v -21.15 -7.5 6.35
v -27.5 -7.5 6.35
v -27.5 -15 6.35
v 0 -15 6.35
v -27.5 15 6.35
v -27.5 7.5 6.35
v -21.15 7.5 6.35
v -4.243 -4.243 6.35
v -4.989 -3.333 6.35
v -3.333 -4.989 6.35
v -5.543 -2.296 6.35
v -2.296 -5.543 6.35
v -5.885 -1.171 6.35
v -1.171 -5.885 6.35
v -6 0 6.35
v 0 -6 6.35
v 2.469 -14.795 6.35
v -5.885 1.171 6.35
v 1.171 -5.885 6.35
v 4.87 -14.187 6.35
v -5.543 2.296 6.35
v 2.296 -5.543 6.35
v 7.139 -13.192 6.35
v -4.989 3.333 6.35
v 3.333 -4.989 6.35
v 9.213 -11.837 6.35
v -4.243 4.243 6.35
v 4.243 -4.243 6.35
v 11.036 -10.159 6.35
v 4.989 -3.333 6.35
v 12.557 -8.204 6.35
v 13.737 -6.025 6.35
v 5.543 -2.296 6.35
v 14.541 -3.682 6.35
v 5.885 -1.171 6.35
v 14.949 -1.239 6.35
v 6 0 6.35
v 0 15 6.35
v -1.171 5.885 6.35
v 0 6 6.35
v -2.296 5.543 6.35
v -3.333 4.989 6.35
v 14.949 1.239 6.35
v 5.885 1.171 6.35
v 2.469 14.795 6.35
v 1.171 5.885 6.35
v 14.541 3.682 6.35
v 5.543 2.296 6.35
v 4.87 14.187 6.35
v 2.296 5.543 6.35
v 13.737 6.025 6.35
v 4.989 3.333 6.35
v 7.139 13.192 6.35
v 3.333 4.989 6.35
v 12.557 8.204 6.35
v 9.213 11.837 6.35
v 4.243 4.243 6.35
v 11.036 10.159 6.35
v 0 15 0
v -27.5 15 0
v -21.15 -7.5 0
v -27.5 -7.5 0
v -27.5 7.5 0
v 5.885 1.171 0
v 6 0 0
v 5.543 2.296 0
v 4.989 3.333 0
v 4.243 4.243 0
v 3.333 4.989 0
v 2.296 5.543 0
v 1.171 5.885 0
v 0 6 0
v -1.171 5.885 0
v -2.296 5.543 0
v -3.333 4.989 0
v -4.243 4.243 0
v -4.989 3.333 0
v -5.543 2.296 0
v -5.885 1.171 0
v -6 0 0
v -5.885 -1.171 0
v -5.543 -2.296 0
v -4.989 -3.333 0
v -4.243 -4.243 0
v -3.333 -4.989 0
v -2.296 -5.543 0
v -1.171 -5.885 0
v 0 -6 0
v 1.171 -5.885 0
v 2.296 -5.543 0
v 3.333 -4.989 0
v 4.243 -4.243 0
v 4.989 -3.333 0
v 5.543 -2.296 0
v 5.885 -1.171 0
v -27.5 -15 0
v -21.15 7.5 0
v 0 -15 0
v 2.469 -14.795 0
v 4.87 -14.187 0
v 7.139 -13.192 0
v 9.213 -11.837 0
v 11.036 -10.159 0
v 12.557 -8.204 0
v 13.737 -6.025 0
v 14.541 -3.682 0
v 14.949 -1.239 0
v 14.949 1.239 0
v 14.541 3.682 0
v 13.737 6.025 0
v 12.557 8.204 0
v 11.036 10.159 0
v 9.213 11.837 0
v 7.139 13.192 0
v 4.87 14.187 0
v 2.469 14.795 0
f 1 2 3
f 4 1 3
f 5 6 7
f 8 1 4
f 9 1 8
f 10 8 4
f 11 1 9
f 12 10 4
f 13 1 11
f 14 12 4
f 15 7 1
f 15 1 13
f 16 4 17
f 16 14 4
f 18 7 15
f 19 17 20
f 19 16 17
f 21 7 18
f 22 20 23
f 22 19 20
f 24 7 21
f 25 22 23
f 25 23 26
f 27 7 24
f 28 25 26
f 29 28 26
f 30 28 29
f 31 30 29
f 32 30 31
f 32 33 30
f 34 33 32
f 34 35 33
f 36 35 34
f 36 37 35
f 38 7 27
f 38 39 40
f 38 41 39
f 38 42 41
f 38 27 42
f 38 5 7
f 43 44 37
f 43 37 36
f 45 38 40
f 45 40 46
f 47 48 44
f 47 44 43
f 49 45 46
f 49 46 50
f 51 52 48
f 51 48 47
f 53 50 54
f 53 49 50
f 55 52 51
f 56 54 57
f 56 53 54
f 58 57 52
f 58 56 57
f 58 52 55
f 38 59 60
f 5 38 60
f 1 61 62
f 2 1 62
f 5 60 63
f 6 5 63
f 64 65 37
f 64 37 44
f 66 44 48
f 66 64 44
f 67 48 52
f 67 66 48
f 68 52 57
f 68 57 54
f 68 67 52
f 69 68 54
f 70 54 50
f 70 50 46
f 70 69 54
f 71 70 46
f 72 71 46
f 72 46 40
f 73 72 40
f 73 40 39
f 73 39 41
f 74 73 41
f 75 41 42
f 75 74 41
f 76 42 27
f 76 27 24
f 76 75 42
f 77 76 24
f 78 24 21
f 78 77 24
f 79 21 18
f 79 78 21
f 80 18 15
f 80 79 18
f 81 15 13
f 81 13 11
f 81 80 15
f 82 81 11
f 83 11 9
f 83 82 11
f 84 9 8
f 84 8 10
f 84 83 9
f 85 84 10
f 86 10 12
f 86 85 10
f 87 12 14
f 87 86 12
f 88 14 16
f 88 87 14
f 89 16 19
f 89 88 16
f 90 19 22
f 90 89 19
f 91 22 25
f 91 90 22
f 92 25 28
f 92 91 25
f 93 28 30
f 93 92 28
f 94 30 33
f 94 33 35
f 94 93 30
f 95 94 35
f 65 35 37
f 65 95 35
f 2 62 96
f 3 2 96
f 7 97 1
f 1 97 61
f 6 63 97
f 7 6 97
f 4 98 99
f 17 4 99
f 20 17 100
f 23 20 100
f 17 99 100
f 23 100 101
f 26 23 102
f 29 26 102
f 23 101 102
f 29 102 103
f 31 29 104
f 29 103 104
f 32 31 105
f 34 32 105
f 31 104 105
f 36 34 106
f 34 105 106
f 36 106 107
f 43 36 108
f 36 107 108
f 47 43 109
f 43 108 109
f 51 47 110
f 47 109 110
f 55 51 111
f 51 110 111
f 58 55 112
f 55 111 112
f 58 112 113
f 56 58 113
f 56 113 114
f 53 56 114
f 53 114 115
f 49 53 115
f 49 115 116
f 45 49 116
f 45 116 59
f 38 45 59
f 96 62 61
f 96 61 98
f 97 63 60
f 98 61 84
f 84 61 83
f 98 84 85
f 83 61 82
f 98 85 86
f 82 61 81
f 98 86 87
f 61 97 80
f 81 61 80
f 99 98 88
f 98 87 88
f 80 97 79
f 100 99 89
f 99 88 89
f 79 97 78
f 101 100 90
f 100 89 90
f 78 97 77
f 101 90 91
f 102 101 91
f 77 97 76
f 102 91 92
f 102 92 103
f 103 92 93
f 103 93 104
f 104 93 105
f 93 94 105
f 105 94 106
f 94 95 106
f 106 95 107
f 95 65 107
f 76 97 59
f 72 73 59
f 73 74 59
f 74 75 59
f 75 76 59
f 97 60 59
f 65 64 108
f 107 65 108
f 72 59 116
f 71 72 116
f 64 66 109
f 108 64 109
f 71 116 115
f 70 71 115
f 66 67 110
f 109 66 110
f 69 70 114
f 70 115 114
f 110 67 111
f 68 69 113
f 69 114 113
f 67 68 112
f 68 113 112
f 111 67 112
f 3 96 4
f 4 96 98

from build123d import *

# Parameters (mm, degrees)
F0_R     = 6
F1_DEPTH = 6.35


# Not quite as in the source:
# - a feature names something its author has since deleted; it is built from what else it names


with BuildPart() as f1:
    # F0 (on Top) → F1 (new body)
    with BuildSketch(Plane.XY):
        with BuildLine():
            Line((-27.5, 15), (-27.5, 7.5))
            Line((-27.5, 7.5), (-21.15, 7.5))
            Line((-21.15, 7.5), (-21.15, -7.5))
            Line((-21.15, -7.5), (-27.5, -7.5))
            Line((-27.5, -7.5), (-27.5, -15))
            Line((-27.5, -15), (3.27e-08, -15))
            ThreePointArc((3.27e-08, -15), (-15, -1.63e-08), (0, 15))
            Line((0, 15), (-27.5, 15))
        make_face()
        with BuildLine():
            ThreePointArc((15, 0), (10.6066017178, 10.6066017178), (0, 15))
            ThreePointArc((0, 15), (-15, -1.63e-08), (3.27e-08, -15))
            ThreePointArc((3.27e-08, -15), (10.6066017294, -10.6066017062), (15, 0))
        make_face()
        Circle(F0_R, mode=Mode.SUBTRACT)
    extrude(amount=F1_DEPTH)


solid = f1.part
